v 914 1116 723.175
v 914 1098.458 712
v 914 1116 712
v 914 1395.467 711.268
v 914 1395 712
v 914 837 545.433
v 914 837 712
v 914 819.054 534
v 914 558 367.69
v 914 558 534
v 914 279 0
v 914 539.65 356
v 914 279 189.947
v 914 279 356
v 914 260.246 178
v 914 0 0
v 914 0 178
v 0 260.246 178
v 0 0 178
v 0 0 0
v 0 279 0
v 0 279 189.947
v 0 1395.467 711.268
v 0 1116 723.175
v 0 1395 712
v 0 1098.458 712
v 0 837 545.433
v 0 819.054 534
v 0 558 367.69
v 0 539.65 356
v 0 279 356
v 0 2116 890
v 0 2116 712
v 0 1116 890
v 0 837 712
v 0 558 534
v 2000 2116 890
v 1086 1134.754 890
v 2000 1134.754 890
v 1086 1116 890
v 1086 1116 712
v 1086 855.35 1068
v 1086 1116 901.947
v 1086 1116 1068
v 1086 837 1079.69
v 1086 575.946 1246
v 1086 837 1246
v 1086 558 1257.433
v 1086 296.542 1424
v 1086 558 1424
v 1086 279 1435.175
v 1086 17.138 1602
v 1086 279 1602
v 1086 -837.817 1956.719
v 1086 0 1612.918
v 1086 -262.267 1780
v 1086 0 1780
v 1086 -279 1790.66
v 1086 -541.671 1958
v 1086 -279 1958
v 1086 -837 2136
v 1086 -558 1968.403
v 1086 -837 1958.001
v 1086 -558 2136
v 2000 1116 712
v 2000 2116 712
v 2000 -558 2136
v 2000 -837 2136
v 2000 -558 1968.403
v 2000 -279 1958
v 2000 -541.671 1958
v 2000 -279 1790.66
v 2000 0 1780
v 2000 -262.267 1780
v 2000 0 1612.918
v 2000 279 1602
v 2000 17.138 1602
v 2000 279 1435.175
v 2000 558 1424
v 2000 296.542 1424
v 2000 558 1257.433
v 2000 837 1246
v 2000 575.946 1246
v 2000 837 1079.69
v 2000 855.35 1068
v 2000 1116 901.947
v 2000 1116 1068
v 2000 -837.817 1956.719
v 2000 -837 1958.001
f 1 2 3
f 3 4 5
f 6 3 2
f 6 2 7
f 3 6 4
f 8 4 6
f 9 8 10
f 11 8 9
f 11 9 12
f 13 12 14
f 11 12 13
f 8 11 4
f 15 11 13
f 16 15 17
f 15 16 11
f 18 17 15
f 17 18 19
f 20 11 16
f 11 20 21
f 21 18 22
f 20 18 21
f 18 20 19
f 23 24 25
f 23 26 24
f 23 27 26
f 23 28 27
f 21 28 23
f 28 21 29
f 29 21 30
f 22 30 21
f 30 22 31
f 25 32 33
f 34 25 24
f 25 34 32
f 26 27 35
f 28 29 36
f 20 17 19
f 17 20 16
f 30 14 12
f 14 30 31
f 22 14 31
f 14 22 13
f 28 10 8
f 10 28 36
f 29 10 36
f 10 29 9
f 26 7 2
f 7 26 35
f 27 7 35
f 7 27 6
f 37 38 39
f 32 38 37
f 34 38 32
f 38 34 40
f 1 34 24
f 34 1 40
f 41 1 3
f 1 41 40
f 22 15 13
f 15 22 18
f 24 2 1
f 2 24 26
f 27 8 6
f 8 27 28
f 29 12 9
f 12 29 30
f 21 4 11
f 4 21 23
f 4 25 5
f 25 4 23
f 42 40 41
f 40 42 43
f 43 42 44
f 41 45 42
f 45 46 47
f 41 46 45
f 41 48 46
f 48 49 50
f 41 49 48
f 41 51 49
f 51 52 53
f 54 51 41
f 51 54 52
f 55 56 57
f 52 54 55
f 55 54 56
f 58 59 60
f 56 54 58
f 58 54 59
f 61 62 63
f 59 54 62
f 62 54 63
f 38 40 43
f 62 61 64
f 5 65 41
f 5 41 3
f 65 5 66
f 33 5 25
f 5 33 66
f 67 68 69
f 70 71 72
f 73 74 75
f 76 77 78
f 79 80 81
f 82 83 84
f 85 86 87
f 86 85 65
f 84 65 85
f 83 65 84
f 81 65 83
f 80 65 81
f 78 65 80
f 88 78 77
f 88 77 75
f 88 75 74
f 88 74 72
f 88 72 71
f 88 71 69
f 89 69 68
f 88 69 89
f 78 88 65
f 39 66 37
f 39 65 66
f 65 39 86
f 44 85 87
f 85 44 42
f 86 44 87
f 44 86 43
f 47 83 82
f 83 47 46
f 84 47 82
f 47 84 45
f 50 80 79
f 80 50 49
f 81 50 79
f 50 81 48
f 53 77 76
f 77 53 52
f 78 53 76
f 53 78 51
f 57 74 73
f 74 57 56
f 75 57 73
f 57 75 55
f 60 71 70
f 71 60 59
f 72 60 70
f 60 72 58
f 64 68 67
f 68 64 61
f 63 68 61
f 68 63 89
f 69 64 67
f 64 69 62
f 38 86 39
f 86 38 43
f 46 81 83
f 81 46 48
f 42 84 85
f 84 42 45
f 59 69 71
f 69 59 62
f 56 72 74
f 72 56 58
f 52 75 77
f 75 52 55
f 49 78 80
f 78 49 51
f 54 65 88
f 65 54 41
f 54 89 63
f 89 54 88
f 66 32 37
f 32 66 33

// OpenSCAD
module stairs(num, rise, width, tread) {
   translate([0,tread,0]) rotate([32.5,0,0]) cube([width,sqrt(pow(tread*(num-1),2)+pow(rise*(num-1),2)),rise*.9]);
   for (a=[0:1:num-1]) {
      translate([0,a*tread,a*rise]) cube([width,tread,rise]);
   } 
}


stairs(5, 178, 914, 279);
translate([0,279*4,178*4]) cube([2000,1000,178]);

translate([2000,279*5,178*4]) rotate([0,0,180]) stairs(8,178,914,279);
